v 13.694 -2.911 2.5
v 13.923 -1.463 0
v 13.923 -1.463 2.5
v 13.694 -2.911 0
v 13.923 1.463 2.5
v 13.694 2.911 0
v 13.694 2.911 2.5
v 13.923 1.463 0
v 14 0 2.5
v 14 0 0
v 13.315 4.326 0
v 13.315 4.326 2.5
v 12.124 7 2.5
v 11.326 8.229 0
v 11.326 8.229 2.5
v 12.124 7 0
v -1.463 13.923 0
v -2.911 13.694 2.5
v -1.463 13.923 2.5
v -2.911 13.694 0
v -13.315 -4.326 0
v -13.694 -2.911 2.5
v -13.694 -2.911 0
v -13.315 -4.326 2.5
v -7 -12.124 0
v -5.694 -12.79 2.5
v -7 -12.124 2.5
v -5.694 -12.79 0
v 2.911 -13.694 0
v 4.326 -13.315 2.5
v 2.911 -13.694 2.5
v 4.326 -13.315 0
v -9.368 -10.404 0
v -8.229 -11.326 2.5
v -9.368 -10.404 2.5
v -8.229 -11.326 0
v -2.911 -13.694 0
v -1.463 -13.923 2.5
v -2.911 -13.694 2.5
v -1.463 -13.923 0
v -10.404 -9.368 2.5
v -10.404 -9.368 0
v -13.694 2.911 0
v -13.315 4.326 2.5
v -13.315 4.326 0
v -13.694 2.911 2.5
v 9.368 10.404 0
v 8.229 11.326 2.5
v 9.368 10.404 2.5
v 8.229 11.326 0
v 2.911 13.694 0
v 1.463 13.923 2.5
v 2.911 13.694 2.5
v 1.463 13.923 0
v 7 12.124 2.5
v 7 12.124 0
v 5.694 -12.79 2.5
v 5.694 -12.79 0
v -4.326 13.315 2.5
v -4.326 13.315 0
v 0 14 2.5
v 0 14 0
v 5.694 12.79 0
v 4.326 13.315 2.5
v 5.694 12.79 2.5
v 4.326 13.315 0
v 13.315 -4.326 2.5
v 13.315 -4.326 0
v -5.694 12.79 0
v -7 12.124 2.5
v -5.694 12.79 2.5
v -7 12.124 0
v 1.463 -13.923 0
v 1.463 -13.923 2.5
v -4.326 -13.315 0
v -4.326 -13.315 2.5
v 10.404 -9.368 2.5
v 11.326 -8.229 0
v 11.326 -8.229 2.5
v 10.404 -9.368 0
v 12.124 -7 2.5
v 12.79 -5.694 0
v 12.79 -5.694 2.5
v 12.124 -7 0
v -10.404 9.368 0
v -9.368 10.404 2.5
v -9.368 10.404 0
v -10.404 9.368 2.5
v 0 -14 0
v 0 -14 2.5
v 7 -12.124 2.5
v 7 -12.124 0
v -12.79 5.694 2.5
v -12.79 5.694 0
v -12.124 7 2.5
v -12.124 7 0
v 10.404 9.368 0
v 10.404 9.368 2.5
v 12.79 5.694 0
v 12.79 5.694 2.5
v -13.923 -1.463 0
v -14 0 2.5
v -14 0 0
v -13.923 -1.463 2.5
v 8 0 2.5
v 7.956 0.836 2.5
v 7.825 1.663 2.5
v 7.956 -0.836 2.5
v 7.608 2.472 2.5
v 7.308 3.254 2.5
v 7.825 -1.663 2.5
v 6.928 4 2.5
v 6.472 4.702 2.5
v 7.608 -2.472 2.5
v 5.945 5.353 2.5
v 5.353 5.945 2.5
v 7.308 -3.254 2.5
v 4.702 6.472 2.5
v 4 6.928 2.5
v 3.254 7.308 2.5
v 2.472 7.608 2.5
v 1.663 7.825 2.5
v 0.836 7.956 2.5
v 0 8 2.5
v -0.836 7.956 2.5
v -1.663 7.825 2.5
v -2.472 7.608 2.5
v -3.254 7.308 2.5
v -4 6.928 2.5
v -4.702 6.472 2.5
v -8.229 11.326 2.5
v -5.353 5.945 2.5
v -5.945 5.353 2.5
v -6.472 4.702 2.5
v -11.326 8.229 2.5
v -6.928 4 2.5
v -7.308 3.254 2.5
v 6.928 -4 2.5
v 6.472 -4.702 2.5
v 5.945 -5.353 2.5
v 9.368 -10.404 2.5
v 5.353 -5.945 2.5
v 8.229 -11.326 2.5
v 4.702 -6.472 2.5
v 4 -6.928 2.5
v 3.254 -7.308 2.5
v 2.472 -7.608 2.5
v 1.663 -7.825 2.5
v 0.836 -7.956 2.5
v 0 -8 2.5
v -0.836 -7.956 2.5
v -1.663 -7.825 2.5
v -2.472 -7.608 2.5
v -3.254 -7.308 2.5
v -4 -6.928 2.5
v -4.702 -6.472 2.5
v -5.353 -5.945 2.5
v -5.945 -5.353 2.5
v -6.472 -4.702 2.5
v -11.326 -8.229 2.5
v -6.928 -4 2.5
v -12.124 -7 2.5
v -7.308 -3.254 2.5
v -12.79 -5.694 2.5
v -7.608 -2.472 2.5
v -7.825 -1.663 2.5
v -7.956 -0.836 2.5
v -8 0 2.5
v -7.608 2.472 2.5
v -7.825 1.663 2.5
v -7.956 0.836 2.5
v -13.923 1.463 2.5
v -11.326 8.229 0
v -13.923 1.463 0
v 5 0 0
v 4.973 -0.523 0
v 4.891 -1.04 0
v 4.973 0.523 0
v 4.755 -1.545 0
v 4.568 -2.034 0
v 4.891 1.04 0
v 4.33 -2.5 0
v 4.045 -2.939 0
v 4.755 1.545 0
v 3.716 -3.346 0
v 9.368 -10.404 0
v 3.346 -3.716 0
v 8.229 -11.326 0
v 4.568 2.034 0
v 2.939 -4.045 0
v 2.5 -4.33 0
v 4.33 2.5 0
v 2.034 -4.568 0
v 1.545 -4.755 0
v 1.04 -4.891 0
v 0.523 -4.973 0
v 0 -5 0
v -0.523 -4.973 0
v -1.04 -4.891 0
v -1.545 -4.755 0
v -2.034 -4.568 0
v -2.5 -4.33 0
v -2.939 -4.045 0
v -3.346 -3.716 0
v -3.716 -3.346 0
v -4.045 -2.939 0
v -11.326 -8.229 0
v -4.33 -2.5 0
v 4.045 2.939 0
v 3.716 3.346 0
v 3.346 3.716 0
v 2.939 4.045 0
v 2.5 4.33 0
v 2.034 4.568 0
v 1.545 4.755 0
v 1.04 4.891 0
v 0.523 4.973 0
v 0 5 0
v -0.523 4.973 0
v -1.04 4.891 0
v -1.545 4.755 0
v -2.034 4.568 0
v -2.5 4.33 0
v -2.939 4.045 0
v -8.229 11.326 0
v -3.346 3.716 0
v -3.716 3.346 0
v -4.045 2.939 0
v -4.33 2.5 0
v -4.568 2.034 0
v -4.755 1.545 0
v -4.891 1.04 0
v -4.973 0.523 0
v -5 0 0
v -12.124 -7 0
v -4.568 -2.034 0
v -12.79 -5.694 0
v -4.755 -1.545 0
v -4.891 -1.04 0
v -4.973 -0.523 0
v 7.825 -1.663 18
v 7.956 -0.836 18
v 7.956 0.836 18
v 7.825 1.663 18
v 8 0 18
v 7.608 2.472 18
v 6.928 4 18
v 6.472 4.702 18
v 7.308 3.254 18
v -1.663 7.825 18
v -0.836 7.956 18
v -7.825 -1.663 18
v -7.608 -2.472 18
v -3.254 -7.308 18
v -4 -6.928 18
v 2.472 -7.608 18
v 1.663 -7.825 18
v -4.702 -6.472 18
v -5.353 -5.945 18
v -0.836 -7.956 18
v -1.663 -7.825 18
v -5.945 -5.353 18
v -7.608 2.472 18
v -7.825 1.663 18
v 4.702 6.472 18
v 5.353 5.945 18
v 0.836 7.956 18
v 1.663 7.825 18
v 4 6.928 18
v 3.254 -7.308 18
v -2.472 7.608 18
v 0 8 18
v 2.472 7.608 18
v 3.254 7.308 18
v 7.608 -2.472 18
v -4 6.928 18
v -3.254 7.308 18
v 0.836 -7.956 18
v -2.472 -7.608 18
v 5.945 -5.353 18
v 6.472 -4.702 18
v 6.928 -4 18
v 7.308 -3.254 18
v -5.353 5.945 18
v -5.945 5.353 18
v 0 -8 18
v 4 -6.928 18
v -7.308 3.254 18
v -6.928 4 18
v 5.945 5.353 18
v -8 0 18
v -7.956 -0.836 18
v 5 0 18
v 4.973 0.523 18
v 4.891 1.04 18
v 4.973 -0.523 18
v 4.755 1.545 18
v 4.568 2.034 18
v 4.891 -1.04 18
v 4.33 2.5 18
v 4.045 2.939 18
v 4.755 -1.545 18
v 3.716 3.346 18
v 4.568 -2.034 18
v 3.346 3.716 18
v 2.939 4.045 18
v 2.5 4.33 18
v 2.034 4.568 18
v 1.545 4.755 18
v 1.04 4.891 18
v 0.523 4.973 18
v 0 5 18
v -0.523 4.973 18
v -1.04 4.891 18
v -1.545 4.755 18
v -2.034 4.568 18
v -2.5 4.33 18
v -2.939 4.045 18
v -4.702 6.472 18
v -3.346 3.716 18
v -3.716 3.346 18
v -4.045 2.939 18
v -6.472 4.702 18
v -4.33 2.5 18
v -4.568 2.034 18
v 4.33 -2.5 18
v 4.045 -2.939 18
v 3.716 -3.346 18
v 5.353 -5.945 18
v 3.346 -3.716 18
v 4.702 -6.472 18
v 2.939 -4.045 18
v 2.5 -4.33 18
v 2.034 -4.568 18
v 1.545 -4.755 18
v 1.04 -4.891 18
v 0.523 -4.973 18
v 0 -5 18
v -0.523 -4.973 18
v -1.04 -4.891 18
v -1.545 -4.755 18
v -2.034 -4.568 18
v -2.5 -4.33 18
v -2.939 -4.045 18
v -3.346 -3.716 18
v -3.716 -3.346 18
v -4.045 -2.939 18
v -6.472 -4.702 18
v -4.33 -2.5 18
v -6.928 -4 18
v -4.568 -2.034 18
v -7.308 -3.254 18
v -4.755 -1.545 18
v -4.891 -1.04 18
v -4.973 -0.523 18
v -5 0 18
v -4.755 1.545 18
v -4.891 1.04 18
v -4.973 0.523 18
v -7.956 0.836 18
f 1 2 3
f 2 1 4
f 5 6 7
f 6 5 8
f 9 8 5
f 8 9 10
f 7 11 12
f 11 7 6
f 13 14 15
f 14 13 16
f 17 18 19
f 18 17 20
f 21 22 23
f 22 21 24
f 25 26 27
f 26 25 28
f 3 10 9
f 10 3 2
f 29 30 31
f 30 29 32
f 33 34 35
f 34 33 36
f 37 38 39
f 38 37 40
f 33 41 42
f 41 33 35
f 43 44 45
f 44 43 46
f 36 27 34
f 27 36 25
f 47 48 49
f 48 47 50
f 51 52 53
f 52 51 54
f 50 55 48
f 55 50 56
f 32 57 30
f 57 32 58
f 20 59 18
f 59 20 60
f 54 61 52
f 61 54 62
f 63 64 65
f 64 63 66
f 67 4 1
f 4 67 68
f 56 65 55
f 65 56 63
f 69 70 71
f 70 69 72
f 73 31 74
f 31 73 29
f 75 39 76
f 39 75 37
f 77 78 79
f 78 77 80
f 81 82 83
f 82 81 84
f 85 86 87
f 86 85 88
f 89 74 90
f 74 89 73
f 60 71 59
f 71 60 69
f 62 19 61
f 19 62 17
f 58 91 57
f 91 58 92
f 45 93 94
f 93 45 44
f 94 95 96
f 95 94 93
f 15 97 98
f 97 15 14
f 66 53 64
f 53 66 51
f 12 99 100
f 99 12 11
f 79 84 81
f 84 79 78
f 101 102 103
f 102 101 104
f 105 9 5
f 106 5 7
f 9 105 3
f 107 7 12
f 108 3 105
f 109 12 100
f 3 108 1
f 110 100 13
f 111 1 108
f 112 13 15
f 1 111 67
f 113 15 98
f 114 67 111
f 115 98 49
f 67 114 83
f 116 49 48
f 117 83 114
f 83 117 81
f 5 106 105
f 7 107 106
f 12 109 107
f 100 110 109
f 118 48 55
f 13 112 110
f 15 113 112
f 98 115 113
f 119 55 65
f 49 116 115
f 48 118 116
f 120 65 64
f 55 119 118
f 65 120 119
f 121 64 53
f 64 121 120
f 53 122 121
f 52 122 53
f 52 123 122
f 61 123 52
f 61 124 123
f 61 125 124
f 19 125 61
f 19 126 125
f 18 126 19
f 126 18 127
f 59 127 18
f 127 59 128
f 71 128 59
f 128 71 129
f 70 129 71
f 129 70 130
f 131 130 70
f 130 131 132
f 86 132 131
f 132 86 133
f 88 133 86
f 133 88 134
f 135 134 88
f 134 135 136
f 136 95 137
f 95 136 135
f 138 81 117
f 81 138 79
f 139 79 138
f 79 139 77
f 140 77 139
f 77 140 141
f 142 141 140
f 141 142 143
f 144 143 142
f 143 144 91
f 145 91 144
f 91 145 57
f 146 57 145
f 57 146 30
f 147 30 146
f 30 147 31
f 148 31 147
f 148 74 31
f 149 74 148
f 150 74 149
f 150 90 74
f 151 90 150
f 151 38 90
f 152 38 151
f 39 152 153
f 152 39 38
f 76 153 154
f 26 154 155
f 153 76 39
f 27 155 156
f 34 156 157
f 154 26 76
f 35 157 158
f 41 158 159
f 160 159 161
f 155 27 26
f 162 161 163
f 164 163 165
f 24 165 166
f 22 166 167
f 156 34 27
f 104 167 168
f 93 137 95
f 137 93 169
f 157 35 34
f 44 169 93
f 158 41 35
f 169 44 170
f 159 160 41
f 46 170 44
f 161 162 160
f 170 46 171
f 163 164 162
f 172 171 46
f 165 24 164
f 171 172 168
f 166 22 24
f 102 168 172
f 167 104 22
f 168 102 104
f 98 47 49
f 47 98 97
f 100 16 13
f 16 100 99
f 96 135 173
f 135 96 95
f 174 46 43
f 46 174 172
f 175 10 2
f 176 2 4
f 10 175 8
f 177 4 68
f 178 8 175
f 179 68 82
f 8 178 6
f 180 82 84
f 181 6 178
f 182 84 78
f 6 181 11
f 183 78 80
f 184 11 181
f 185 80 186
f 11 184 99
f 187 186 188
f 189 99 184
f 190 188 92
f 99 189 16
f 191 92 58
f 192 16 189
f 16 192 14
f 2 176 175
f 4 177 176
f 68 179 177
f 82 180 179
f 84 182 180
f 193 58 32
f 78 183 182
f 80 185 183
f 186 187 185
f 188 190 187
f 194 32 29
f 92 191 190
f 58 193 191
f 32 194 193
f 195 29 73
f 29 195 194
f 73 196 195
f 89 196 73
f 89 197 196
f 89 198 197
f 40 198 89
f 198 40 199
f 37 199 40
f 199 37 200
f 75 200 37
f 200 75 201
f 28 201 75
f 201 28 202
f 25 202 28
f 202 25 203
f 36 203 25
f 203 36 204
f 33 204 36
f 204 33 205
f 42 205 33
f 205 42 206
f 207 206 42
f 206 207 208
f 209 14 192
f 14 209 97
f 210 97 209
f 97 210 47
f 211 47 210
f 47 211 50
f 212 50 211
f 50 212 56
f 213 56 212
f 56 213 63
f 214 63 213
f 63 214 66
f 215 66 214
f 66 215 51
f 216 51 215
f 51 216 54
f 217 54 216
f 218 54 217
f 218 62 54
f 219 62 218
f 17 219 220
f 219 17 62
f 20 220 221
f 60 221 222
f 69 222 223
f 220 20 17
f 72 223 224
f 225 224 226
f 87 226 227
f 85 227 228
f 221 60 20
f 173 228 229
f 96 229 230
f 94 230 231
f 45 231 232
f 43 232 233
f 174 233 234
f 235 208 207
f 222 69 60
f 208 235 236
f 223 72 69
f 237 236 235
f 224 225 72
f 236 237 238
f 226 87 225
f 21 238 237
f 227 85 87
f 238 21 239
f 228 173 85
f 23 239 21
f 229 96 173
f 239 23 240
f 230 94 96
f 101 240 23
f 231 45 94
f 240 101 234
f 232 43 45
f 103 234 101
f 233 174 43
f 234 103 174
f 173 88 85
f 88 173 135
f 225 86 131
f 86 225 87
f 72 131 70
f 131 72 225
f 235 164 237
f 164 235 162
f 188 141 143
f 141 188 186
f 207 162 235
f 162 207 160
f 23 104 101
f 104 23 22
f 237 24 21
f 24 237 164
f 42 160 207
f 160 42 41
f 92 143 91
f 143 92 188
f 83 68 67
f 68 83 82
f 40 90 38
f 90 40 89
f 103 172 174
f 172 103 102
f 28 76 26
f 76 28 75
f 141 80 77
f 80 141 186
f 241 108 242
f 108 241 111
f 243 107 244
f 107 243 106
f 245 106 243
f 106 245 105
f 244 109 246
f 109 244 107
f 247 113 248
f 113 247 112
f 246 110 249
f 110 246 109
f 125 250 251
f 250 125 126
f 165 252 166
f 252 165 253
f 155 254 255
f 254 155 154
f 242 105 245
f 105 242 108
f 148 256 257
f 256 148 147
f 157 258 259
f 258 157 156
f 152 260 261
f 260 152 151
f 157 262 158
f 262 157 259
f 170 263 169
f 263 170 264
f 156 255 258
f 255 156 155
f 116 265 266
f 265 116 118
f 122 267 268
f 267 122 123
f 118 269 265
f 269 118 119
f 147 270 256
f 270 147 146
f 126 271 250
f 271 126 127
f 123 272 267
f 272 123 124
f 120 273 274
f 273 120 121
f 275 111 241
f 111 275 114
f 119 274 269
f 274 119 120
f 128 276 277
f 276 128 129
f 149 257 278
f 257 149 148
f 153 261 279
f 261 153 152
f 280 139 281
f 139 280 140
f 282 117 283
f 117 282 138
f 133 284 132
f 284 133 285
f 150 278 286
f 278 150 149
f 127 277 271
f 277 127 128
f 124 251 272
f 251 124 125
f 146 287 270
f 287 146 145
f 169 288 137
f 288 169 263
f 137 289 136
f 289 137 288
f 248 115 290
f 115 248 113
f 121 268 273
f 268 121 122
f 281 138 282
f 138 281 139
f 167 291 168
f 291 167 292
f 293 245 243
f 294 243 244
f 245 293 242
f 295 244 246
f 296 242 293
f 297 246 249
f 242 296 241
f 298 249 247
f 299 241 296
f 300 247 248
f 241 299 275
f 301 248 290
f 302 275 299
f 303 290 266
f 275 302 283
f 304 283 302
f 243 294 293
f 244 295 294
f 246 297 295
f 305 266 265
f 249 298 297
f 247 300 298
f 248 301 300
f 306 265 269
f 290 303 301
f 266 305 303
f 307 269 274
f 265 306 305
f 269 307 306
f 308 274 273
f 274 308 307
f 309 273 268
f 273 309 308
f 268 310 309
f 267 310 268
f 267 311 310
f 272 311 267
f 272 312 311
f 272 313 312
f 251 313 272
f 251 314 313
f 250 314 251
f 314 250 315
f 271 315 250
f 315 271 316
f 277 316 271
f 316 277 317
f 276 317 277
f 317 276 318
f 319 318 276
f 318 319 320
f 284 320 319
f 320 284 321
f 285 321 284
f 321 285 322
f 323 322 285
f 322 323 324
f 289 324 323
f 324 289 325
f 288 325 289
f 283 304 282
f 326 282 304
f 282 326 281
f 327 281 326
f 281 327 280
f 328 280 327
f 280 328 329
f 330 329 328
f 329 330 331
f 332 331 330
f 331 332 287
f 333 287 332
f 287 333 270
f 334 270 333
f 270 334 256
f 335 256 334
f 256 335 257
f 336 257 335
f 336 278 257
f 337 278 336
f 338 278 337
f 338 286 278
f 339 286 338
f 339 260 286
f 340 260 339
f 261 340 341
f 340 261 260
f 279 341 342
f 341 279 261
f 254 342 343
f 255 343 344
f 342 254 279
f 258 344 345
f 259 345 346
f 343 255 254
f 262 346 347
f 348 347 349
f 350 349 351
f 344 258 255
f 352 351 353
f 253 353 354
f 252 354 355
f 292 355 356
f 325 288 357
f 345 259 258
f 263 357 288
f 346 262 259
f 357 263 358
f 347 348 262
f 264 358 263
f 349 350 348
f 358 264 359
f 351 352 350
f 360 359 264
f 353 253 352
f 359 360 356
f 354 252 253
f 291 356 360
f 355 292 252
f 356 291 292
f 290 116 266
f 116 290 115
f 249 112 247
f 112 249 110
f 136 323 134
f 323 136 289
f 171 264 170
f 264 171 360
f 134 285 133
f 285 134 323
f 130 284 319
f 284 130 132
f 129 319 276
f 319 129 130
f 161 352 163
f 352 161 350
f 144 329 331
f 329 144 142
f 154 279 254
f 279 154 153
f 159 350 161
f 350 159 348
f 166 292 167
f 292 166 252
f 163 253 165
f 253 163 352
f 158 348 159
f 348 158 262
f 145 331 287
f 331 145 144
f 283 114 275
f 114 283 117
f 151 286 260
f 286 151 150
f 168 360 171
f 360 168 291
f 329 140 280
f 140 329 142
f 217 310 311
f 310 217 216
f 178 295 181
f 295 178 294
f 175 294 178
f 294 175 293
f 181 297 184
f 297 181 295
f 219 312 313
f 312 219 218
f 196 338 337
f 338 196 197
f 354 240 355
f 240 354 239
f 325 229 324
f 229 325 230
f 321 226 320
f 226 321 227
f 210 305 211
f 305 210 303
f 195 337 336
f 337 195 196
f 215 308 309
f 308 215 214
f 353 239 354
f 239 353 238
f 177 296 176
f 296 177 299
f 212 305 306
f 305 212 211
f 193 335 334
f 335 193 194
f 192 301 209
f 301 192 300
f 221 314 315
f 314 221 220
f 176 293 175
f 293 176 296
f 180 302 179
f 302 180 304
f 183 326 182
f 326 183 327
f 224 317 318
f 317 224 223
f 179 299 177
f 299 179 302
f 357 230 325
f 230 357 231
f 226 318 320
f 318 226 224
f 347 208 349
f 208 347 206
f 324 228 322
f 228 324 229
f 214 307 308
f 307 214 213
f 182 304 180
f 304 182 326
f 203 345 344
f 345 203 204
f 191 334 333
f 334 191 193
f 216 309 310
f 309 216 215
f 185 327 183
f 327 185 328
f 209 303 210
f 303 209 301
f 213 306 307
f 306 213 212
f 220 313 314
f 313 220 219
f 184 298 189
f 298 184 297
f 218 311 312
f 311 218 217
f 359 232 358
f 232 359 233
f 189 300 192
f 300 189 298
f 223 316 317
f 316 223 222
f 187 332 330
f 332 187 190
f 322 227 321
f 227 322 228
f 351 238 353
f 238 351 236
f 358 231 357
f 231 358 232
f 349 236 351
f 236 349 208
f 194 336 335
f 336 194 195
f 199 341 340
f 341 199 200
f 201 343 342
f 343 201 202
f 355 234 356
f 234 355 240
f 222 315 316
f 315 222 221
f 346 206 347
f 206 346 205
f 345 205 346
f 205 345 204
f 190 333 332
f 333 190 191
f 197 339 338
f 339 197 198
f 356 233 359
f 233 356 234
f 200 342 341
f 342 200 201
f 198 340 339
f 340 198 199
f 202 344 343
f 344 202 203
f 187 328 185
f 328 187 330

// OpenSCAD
// Flanged sleeve bushing.
$fn = 60;
eps = 0.02;
inner_d = 10;
outer_d = 16;
length = 18;
flange_d = 28;
flange_t = 2.5;
difference() {
    union() {
        cylinder(d = flange_d, h = flange_t);
        cylinder(d = outer_d, h = length);
    }
    translate([0, 0, -eps]) cylinder(d = inner_d, h = length + 2 * eps);
}
